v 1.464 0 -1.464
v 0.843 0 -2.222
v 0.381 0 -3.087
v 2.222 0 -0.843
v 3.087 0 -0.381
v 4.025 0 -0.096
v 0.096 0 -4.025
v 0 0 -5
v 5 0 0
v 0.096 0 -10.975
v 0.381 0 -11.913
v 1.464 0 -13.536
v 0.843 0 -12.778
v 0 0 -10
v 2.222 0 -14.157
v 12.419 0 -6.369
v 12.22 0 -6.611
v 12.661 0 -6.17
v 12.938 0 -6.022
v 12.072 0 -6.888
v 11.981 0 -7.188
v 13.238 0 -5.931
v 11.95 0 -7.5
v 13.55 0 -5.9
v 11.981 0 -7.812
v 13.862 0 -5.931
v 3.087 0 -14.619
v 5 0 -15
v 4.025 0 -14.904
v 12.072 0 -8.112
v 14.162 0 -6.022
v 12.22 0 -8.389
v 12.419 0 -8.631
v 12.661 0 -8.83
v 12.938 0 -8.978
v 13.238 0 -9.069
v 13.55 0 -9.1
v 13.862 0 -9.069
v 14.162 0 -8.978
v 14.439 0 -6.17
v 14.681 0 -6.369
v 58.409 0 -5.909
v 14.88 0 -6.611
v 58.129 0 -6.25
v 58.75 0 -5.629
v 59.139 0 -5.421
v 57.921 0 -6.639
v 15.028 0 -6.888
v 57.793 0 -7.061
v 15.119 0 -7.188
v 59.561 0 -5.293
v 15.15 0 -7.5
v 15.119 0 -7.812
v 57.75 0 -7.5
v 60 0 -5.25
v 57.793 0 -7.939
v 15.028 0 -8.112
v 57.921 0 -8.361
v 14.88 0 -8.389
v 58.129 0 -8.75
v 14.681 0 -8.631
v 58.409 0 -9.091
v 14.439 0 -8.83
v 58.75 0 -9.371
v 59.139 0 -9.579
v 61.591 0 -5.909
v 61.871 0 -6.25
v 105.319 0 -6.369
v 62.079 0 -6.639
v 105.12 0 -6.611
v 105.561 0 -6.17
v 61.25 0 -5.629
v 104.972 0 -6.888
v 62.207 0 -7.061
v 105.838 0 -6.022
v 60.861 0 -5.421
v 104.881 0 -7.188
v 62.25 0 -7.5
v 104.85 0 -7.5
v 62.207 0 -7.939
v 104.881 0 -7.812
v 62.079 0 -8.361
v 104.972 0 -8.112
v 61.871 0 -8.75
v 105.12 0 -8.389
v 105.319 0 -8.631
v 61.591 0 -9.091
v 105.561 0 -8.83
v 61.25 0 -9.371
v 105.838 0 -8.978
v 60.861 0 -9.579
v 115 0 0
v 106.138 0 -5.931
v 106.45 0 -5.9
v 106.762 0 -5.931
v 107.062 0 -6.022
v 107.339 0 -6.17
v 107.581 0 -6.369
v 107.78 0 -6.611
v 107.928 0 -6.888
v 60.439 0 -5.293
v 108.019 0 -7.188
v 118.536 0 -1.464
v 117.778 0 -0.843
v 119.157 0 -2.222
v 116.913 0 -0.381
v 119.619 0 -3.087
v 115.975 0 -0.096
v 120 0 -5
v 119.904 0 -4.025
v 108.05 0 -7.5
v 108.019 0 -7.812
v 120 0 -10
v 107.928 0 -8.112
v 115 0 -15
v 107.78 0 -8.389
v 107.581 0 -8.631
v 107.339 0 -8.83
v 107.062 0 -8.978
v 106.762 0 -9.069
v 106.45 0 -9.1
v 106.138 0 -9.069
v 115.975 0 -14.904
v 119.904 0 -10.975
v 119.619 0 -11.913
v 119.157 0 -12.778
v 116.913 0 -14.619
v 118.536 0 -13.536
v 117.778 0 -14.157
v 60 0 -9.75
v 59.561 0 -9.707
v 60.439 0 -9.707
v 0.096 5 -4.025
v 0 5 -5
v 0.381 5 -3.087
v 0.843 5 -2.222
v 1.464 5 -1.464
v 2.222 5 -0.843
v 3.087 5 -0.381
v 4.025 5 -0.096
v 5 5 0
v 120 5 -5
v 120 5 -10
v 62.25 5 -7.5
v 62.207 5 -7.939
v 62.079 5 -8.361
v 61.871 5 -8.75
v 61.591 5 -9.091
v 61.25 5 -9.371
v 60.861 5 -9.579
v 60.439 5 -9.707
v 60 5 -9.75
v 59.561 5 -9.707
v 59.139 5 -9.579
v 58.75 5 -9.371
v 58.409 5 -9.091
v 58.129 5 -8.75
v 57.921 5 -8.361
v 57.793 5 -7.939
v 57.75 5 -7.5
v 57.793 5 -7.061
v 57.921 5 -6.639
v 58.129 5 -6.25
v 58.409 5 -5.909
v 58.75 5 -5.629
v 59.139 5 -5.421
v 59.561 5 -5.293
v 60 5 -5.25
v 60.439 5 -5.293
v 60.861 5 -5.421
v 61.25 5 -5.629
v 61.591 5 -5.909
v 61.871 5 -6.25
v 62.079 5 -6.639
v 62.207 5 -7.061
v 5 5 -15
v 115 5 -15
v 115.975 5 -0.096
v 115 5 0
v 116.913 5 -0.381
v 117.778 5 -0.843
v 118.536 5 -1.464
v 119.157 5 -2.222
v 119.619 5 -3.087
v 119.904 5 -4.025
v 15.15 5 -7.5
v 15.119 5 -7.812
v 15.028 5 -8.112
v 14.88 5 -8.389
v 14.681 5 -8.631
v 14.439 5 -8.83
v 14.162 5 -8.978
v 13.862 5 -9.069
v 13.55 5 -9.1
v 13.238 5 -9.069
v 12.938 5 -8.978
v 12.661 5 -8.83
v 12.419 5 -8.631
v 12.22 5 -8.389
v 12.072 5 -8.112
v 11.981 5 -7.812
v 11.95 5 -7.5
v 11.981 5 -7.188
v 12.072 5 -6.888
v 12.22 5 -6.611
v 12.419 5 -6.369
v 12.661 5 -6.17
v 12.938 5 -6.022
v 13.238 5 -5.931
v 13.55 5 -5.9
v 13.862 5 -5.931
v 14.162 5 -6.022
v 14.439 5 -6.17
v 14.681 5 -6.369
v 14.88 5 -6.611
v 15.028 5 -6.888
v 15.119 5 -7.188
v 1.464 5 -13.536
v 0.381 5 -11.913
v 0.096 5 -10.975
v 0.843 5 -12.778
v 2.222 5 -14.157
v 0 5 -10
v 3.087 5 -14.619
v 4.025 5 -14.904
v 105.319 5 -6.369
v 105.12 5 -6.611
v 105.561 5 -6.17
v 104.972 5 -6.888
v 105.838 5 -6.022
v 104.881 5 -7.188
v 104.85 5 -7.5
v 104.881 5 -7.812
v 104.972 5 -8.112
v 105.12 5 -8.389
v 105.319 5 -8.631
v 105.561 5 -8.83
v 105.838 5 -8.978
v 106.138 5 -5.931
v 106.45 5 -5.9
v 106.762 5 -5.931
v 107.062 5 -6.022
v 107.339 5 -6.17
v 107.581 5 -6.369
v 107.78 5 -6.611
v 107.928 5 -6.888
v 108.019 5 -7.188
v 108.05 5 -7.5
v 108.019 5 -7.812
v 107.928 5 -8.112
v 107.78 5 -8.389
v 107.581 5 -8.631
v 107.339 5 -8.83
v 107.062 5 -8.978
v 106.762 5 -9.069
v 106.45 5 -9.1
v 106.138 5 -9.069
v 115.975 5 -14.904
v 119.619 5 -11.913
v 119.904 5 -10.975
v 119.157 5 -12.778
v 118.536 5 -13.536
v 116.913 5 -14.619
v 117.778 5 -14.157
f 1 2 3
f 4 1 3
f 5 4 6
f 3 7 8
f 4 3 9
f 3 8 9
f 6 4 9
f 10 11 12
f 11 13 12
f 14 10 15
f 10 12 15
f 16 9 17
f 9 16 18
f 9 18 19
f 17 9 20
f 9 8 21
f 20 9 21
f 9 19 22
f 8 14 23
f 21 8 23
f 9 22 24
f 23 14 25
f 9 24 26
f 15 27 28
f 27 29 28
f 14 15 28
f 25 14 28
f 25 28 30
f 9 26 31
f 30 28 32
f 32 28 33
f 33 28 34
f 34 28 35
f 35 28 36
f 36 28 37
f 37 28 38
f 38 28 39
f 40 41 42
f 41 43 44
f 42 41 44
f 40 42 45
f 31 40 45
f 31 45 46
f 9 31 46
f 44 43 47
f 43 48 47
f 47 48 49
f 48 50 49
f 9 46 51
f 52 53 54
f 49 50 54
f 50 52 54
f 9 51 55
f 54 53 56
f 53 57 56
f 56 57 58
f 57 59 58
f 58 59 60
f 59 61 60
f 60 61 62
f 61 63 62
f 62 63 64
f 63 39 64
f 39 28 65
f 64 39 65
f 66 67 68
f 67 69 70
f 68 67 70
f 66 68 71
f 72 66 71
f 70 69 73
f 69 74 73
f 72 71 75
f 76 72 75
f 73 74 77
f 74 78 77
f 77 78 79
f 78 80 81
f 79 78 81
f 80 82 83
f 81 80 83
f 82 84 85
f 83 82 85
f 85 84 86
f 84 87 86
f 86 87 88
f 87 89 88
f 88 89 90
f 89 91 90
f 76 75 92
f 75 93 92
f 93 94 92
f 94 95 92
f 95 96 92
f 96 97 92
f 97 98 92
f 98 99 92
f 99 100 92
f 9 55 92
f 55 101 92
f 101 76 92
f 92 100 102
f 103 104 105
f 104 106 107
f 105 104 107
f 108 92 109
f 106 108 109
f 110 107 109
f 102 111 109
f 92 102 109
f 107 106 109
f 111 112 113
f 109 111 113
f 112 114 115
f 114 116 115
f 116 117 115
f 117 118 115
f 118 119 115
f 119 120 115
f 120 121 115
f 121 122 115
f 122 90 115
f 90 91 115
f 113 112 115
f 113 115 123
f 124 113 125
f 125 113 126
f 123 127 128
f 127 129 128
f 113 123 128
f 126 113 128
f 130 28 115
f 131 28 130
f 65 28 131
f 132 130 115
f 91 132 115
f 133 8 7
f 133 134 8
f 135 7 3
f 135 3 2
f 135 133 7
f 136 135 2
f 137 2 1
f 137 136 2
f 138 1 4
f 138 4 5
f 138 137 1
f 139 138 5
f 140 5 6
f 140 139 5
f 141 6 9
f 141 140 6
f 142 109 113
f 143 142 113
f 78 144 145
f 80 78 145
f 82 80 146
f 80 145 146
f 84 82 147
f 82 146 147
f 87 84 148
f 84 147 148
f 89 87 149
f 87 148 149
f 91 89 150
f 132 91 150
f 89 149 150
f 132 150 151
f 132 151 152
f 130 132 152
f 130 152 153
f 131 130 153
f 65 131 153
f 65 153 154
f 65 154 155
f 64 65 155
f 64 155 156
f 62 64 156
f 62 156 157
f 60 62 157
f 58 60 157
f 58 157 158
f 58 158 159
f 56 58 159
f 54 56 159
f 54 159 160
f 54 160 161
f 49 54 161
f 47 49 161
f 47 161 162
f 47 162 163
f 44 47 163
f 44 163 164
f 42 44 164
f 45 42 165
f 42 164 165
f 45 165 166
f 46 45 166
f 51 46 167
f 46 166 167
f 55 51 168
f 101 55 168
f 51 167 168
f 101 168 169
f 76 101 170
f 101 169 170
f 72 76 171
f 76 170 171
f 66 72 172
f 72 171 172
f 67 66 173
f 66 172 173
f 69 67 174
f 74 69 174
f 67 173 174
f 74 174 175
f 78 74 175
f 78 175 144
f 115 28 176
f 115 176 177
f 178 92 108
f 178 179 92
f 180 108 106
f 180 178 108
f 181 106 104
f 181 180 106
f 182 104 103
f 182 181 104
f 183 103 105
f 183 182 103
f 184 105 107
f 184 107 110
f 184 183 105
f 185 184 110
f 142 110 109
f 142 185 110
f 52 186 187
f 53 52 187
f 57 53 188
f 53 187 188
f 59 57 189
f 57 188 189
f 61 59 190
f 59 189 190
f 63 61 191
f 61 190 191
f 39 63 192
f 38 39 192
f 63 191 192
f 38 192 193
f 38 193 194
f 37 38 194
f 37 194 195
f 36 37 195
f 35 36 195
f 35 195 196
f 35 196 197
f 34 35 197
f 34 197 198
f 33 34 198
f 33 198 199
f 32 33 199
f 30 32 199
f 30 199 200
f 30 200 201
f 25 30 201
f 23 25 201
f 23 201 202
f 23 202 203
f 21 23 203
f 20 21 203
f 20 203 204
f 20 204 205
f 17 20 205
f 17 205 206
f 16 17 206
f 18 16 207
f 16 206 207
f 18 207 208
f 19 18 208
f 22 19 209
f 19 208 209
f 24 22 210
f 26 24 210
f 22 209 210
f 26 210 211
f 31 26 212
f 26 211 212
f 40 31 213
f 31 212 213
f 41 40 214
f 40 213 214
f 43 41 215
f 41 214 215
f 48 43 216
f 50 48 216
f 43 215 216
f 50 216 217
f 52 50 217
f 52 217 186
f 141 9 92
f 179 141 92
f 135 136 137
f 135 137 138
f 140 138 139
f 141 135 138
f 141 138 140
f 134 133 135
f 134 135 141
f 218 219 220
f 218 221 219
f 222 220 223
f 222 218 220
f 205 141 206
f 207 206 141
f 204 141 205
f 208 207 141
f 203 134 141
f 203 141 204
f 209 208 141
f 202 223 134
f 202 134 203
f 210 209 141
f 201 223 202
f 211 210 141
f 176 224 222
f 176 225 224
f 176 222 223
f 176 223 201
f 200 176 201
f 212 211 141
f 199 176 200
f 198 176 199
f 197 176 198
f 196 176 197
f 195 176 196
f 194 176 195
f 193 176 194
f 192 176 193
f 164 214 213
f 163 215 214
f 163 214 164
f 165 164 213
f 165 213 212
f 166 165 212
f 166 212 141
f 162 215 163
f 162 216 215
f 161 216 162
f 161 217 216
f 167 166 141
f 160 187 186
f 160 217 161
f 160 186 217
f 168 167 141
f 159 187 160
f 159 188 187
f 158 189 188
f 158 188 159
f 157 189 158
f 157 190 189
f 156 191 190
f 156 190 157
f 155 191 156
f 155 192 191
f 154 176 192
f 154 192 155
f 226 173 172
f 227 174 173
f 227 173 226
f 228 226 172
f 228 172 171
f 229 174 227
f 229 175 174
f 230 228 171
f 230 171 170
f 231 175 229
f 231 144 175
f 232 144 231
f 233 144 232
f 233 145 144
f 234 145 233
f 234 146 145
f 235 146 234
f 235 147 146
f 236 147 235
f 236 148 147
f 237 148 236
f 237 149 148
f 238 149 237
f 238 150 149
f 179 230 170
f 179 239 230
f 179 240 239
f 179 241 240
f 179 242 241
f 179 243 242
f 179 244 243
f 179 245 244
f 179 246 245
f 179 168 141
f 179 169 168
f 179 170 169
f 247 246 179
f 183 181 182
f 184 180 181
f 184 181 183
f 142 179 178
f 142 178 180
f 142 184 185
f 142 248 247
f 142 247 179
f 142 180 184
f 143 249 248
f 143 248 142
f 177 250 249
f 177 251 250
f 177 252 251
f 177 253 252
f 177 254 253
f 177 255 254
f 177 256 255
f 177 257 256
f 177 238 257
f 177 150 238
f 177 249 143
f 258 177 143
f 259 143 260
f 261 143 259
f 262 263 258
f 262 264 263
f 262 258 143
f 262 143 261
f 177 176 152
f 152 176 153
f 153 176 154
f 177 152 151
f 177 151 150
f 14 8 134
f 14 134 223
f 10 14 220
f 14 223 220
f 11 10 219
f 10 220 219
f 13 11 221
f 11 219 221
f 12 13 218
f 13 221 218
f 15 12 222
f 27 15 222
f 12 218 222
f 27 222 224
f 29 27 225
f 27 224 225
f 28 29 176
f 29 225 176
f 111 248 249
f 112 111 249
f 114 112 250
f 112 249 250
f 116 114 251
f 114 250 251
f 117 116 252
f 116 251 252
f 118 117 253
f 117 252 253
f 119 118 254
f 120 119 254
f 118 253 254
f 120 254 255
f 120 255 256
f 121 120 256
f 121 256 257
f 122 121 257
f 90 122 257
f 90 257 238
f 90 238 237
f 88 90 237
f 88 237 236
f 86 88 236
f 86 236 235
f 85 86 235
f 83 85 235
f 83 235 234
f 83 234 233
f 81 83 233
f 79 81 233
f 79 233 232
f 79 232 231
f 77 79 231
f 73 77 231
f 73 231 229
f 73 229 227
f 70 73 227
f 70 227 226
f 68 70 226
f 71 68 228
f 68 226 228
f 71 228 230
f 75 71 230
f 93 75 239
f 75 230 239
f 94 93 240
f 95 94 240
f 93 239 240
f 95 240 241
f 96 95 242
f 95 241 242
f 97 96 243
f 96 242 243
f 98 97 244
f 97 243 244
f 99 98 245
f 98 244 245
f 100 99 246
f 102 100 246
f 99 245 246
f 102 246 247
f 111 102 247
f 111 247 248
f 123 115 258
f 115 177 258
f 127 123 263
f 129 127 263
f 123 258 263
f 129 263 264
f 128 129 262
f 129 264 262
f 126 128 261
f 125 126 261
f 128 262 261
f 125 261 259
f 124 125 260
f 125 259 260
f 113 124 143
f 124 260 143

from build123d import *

# Parameters (mm, degrees)
SKETCH_1_W          = 120
SKETCH_1_H          = 15
EXTRUDE_1_DEPTH     = 5
SKETCH_2_R          = 1.6
SKETCH_2_R_2        = 2.25
CUT_EXTRUDE_1_DEPTH = 6
FILLET_1_R          = 5


with BuildPart() as part:
    # Эскиз1 → Бобышка-Вытянуть1 (new body)
    with BuildSketch(Plane(origin=(0, 0, 0), x_dir=(1, 0, 0), z_dir=(0, 1, 0))):
        with Locations((60, 7.5)):
            Rectangle(SKETCH_1_W, SKETCH_1_H)
    extrude(amount=EXTRUDE_1_DEPTH)

    # Эскиз2 → Вырез-Вытянуть1 (cut, through all)
    with BuildSketch(Plane(origin=(0, 5, 0), x_dir=(1, 0, 0), z_dir=(0, 1, 0))):
        with Locations((13.55, 7.5)):
            Circle(SKETCH_2_R)
        with Locations((106.45, 7.5)):
            Circle(SKETCH_2_R)
        with Locations((60, 7.5)):
            Circle(SKETCH_2_R_2)
    extrude(amount=-CUT_EXTRUDE_1_DEPTH, mode=Mode.SUBTRACT)

    # Скругление1
    fillet_1_edges = [part.edges().sort_by_distance(p)[0] for p in [
        (0, 2.5, -15),
        (120, 2.5, -15),
        (120, 2.5, 0),
        (0, 2.5, 0),
    ]]
    fillet(fillet_1_edges, radius=FILLET_1_R)


solid = part.part
